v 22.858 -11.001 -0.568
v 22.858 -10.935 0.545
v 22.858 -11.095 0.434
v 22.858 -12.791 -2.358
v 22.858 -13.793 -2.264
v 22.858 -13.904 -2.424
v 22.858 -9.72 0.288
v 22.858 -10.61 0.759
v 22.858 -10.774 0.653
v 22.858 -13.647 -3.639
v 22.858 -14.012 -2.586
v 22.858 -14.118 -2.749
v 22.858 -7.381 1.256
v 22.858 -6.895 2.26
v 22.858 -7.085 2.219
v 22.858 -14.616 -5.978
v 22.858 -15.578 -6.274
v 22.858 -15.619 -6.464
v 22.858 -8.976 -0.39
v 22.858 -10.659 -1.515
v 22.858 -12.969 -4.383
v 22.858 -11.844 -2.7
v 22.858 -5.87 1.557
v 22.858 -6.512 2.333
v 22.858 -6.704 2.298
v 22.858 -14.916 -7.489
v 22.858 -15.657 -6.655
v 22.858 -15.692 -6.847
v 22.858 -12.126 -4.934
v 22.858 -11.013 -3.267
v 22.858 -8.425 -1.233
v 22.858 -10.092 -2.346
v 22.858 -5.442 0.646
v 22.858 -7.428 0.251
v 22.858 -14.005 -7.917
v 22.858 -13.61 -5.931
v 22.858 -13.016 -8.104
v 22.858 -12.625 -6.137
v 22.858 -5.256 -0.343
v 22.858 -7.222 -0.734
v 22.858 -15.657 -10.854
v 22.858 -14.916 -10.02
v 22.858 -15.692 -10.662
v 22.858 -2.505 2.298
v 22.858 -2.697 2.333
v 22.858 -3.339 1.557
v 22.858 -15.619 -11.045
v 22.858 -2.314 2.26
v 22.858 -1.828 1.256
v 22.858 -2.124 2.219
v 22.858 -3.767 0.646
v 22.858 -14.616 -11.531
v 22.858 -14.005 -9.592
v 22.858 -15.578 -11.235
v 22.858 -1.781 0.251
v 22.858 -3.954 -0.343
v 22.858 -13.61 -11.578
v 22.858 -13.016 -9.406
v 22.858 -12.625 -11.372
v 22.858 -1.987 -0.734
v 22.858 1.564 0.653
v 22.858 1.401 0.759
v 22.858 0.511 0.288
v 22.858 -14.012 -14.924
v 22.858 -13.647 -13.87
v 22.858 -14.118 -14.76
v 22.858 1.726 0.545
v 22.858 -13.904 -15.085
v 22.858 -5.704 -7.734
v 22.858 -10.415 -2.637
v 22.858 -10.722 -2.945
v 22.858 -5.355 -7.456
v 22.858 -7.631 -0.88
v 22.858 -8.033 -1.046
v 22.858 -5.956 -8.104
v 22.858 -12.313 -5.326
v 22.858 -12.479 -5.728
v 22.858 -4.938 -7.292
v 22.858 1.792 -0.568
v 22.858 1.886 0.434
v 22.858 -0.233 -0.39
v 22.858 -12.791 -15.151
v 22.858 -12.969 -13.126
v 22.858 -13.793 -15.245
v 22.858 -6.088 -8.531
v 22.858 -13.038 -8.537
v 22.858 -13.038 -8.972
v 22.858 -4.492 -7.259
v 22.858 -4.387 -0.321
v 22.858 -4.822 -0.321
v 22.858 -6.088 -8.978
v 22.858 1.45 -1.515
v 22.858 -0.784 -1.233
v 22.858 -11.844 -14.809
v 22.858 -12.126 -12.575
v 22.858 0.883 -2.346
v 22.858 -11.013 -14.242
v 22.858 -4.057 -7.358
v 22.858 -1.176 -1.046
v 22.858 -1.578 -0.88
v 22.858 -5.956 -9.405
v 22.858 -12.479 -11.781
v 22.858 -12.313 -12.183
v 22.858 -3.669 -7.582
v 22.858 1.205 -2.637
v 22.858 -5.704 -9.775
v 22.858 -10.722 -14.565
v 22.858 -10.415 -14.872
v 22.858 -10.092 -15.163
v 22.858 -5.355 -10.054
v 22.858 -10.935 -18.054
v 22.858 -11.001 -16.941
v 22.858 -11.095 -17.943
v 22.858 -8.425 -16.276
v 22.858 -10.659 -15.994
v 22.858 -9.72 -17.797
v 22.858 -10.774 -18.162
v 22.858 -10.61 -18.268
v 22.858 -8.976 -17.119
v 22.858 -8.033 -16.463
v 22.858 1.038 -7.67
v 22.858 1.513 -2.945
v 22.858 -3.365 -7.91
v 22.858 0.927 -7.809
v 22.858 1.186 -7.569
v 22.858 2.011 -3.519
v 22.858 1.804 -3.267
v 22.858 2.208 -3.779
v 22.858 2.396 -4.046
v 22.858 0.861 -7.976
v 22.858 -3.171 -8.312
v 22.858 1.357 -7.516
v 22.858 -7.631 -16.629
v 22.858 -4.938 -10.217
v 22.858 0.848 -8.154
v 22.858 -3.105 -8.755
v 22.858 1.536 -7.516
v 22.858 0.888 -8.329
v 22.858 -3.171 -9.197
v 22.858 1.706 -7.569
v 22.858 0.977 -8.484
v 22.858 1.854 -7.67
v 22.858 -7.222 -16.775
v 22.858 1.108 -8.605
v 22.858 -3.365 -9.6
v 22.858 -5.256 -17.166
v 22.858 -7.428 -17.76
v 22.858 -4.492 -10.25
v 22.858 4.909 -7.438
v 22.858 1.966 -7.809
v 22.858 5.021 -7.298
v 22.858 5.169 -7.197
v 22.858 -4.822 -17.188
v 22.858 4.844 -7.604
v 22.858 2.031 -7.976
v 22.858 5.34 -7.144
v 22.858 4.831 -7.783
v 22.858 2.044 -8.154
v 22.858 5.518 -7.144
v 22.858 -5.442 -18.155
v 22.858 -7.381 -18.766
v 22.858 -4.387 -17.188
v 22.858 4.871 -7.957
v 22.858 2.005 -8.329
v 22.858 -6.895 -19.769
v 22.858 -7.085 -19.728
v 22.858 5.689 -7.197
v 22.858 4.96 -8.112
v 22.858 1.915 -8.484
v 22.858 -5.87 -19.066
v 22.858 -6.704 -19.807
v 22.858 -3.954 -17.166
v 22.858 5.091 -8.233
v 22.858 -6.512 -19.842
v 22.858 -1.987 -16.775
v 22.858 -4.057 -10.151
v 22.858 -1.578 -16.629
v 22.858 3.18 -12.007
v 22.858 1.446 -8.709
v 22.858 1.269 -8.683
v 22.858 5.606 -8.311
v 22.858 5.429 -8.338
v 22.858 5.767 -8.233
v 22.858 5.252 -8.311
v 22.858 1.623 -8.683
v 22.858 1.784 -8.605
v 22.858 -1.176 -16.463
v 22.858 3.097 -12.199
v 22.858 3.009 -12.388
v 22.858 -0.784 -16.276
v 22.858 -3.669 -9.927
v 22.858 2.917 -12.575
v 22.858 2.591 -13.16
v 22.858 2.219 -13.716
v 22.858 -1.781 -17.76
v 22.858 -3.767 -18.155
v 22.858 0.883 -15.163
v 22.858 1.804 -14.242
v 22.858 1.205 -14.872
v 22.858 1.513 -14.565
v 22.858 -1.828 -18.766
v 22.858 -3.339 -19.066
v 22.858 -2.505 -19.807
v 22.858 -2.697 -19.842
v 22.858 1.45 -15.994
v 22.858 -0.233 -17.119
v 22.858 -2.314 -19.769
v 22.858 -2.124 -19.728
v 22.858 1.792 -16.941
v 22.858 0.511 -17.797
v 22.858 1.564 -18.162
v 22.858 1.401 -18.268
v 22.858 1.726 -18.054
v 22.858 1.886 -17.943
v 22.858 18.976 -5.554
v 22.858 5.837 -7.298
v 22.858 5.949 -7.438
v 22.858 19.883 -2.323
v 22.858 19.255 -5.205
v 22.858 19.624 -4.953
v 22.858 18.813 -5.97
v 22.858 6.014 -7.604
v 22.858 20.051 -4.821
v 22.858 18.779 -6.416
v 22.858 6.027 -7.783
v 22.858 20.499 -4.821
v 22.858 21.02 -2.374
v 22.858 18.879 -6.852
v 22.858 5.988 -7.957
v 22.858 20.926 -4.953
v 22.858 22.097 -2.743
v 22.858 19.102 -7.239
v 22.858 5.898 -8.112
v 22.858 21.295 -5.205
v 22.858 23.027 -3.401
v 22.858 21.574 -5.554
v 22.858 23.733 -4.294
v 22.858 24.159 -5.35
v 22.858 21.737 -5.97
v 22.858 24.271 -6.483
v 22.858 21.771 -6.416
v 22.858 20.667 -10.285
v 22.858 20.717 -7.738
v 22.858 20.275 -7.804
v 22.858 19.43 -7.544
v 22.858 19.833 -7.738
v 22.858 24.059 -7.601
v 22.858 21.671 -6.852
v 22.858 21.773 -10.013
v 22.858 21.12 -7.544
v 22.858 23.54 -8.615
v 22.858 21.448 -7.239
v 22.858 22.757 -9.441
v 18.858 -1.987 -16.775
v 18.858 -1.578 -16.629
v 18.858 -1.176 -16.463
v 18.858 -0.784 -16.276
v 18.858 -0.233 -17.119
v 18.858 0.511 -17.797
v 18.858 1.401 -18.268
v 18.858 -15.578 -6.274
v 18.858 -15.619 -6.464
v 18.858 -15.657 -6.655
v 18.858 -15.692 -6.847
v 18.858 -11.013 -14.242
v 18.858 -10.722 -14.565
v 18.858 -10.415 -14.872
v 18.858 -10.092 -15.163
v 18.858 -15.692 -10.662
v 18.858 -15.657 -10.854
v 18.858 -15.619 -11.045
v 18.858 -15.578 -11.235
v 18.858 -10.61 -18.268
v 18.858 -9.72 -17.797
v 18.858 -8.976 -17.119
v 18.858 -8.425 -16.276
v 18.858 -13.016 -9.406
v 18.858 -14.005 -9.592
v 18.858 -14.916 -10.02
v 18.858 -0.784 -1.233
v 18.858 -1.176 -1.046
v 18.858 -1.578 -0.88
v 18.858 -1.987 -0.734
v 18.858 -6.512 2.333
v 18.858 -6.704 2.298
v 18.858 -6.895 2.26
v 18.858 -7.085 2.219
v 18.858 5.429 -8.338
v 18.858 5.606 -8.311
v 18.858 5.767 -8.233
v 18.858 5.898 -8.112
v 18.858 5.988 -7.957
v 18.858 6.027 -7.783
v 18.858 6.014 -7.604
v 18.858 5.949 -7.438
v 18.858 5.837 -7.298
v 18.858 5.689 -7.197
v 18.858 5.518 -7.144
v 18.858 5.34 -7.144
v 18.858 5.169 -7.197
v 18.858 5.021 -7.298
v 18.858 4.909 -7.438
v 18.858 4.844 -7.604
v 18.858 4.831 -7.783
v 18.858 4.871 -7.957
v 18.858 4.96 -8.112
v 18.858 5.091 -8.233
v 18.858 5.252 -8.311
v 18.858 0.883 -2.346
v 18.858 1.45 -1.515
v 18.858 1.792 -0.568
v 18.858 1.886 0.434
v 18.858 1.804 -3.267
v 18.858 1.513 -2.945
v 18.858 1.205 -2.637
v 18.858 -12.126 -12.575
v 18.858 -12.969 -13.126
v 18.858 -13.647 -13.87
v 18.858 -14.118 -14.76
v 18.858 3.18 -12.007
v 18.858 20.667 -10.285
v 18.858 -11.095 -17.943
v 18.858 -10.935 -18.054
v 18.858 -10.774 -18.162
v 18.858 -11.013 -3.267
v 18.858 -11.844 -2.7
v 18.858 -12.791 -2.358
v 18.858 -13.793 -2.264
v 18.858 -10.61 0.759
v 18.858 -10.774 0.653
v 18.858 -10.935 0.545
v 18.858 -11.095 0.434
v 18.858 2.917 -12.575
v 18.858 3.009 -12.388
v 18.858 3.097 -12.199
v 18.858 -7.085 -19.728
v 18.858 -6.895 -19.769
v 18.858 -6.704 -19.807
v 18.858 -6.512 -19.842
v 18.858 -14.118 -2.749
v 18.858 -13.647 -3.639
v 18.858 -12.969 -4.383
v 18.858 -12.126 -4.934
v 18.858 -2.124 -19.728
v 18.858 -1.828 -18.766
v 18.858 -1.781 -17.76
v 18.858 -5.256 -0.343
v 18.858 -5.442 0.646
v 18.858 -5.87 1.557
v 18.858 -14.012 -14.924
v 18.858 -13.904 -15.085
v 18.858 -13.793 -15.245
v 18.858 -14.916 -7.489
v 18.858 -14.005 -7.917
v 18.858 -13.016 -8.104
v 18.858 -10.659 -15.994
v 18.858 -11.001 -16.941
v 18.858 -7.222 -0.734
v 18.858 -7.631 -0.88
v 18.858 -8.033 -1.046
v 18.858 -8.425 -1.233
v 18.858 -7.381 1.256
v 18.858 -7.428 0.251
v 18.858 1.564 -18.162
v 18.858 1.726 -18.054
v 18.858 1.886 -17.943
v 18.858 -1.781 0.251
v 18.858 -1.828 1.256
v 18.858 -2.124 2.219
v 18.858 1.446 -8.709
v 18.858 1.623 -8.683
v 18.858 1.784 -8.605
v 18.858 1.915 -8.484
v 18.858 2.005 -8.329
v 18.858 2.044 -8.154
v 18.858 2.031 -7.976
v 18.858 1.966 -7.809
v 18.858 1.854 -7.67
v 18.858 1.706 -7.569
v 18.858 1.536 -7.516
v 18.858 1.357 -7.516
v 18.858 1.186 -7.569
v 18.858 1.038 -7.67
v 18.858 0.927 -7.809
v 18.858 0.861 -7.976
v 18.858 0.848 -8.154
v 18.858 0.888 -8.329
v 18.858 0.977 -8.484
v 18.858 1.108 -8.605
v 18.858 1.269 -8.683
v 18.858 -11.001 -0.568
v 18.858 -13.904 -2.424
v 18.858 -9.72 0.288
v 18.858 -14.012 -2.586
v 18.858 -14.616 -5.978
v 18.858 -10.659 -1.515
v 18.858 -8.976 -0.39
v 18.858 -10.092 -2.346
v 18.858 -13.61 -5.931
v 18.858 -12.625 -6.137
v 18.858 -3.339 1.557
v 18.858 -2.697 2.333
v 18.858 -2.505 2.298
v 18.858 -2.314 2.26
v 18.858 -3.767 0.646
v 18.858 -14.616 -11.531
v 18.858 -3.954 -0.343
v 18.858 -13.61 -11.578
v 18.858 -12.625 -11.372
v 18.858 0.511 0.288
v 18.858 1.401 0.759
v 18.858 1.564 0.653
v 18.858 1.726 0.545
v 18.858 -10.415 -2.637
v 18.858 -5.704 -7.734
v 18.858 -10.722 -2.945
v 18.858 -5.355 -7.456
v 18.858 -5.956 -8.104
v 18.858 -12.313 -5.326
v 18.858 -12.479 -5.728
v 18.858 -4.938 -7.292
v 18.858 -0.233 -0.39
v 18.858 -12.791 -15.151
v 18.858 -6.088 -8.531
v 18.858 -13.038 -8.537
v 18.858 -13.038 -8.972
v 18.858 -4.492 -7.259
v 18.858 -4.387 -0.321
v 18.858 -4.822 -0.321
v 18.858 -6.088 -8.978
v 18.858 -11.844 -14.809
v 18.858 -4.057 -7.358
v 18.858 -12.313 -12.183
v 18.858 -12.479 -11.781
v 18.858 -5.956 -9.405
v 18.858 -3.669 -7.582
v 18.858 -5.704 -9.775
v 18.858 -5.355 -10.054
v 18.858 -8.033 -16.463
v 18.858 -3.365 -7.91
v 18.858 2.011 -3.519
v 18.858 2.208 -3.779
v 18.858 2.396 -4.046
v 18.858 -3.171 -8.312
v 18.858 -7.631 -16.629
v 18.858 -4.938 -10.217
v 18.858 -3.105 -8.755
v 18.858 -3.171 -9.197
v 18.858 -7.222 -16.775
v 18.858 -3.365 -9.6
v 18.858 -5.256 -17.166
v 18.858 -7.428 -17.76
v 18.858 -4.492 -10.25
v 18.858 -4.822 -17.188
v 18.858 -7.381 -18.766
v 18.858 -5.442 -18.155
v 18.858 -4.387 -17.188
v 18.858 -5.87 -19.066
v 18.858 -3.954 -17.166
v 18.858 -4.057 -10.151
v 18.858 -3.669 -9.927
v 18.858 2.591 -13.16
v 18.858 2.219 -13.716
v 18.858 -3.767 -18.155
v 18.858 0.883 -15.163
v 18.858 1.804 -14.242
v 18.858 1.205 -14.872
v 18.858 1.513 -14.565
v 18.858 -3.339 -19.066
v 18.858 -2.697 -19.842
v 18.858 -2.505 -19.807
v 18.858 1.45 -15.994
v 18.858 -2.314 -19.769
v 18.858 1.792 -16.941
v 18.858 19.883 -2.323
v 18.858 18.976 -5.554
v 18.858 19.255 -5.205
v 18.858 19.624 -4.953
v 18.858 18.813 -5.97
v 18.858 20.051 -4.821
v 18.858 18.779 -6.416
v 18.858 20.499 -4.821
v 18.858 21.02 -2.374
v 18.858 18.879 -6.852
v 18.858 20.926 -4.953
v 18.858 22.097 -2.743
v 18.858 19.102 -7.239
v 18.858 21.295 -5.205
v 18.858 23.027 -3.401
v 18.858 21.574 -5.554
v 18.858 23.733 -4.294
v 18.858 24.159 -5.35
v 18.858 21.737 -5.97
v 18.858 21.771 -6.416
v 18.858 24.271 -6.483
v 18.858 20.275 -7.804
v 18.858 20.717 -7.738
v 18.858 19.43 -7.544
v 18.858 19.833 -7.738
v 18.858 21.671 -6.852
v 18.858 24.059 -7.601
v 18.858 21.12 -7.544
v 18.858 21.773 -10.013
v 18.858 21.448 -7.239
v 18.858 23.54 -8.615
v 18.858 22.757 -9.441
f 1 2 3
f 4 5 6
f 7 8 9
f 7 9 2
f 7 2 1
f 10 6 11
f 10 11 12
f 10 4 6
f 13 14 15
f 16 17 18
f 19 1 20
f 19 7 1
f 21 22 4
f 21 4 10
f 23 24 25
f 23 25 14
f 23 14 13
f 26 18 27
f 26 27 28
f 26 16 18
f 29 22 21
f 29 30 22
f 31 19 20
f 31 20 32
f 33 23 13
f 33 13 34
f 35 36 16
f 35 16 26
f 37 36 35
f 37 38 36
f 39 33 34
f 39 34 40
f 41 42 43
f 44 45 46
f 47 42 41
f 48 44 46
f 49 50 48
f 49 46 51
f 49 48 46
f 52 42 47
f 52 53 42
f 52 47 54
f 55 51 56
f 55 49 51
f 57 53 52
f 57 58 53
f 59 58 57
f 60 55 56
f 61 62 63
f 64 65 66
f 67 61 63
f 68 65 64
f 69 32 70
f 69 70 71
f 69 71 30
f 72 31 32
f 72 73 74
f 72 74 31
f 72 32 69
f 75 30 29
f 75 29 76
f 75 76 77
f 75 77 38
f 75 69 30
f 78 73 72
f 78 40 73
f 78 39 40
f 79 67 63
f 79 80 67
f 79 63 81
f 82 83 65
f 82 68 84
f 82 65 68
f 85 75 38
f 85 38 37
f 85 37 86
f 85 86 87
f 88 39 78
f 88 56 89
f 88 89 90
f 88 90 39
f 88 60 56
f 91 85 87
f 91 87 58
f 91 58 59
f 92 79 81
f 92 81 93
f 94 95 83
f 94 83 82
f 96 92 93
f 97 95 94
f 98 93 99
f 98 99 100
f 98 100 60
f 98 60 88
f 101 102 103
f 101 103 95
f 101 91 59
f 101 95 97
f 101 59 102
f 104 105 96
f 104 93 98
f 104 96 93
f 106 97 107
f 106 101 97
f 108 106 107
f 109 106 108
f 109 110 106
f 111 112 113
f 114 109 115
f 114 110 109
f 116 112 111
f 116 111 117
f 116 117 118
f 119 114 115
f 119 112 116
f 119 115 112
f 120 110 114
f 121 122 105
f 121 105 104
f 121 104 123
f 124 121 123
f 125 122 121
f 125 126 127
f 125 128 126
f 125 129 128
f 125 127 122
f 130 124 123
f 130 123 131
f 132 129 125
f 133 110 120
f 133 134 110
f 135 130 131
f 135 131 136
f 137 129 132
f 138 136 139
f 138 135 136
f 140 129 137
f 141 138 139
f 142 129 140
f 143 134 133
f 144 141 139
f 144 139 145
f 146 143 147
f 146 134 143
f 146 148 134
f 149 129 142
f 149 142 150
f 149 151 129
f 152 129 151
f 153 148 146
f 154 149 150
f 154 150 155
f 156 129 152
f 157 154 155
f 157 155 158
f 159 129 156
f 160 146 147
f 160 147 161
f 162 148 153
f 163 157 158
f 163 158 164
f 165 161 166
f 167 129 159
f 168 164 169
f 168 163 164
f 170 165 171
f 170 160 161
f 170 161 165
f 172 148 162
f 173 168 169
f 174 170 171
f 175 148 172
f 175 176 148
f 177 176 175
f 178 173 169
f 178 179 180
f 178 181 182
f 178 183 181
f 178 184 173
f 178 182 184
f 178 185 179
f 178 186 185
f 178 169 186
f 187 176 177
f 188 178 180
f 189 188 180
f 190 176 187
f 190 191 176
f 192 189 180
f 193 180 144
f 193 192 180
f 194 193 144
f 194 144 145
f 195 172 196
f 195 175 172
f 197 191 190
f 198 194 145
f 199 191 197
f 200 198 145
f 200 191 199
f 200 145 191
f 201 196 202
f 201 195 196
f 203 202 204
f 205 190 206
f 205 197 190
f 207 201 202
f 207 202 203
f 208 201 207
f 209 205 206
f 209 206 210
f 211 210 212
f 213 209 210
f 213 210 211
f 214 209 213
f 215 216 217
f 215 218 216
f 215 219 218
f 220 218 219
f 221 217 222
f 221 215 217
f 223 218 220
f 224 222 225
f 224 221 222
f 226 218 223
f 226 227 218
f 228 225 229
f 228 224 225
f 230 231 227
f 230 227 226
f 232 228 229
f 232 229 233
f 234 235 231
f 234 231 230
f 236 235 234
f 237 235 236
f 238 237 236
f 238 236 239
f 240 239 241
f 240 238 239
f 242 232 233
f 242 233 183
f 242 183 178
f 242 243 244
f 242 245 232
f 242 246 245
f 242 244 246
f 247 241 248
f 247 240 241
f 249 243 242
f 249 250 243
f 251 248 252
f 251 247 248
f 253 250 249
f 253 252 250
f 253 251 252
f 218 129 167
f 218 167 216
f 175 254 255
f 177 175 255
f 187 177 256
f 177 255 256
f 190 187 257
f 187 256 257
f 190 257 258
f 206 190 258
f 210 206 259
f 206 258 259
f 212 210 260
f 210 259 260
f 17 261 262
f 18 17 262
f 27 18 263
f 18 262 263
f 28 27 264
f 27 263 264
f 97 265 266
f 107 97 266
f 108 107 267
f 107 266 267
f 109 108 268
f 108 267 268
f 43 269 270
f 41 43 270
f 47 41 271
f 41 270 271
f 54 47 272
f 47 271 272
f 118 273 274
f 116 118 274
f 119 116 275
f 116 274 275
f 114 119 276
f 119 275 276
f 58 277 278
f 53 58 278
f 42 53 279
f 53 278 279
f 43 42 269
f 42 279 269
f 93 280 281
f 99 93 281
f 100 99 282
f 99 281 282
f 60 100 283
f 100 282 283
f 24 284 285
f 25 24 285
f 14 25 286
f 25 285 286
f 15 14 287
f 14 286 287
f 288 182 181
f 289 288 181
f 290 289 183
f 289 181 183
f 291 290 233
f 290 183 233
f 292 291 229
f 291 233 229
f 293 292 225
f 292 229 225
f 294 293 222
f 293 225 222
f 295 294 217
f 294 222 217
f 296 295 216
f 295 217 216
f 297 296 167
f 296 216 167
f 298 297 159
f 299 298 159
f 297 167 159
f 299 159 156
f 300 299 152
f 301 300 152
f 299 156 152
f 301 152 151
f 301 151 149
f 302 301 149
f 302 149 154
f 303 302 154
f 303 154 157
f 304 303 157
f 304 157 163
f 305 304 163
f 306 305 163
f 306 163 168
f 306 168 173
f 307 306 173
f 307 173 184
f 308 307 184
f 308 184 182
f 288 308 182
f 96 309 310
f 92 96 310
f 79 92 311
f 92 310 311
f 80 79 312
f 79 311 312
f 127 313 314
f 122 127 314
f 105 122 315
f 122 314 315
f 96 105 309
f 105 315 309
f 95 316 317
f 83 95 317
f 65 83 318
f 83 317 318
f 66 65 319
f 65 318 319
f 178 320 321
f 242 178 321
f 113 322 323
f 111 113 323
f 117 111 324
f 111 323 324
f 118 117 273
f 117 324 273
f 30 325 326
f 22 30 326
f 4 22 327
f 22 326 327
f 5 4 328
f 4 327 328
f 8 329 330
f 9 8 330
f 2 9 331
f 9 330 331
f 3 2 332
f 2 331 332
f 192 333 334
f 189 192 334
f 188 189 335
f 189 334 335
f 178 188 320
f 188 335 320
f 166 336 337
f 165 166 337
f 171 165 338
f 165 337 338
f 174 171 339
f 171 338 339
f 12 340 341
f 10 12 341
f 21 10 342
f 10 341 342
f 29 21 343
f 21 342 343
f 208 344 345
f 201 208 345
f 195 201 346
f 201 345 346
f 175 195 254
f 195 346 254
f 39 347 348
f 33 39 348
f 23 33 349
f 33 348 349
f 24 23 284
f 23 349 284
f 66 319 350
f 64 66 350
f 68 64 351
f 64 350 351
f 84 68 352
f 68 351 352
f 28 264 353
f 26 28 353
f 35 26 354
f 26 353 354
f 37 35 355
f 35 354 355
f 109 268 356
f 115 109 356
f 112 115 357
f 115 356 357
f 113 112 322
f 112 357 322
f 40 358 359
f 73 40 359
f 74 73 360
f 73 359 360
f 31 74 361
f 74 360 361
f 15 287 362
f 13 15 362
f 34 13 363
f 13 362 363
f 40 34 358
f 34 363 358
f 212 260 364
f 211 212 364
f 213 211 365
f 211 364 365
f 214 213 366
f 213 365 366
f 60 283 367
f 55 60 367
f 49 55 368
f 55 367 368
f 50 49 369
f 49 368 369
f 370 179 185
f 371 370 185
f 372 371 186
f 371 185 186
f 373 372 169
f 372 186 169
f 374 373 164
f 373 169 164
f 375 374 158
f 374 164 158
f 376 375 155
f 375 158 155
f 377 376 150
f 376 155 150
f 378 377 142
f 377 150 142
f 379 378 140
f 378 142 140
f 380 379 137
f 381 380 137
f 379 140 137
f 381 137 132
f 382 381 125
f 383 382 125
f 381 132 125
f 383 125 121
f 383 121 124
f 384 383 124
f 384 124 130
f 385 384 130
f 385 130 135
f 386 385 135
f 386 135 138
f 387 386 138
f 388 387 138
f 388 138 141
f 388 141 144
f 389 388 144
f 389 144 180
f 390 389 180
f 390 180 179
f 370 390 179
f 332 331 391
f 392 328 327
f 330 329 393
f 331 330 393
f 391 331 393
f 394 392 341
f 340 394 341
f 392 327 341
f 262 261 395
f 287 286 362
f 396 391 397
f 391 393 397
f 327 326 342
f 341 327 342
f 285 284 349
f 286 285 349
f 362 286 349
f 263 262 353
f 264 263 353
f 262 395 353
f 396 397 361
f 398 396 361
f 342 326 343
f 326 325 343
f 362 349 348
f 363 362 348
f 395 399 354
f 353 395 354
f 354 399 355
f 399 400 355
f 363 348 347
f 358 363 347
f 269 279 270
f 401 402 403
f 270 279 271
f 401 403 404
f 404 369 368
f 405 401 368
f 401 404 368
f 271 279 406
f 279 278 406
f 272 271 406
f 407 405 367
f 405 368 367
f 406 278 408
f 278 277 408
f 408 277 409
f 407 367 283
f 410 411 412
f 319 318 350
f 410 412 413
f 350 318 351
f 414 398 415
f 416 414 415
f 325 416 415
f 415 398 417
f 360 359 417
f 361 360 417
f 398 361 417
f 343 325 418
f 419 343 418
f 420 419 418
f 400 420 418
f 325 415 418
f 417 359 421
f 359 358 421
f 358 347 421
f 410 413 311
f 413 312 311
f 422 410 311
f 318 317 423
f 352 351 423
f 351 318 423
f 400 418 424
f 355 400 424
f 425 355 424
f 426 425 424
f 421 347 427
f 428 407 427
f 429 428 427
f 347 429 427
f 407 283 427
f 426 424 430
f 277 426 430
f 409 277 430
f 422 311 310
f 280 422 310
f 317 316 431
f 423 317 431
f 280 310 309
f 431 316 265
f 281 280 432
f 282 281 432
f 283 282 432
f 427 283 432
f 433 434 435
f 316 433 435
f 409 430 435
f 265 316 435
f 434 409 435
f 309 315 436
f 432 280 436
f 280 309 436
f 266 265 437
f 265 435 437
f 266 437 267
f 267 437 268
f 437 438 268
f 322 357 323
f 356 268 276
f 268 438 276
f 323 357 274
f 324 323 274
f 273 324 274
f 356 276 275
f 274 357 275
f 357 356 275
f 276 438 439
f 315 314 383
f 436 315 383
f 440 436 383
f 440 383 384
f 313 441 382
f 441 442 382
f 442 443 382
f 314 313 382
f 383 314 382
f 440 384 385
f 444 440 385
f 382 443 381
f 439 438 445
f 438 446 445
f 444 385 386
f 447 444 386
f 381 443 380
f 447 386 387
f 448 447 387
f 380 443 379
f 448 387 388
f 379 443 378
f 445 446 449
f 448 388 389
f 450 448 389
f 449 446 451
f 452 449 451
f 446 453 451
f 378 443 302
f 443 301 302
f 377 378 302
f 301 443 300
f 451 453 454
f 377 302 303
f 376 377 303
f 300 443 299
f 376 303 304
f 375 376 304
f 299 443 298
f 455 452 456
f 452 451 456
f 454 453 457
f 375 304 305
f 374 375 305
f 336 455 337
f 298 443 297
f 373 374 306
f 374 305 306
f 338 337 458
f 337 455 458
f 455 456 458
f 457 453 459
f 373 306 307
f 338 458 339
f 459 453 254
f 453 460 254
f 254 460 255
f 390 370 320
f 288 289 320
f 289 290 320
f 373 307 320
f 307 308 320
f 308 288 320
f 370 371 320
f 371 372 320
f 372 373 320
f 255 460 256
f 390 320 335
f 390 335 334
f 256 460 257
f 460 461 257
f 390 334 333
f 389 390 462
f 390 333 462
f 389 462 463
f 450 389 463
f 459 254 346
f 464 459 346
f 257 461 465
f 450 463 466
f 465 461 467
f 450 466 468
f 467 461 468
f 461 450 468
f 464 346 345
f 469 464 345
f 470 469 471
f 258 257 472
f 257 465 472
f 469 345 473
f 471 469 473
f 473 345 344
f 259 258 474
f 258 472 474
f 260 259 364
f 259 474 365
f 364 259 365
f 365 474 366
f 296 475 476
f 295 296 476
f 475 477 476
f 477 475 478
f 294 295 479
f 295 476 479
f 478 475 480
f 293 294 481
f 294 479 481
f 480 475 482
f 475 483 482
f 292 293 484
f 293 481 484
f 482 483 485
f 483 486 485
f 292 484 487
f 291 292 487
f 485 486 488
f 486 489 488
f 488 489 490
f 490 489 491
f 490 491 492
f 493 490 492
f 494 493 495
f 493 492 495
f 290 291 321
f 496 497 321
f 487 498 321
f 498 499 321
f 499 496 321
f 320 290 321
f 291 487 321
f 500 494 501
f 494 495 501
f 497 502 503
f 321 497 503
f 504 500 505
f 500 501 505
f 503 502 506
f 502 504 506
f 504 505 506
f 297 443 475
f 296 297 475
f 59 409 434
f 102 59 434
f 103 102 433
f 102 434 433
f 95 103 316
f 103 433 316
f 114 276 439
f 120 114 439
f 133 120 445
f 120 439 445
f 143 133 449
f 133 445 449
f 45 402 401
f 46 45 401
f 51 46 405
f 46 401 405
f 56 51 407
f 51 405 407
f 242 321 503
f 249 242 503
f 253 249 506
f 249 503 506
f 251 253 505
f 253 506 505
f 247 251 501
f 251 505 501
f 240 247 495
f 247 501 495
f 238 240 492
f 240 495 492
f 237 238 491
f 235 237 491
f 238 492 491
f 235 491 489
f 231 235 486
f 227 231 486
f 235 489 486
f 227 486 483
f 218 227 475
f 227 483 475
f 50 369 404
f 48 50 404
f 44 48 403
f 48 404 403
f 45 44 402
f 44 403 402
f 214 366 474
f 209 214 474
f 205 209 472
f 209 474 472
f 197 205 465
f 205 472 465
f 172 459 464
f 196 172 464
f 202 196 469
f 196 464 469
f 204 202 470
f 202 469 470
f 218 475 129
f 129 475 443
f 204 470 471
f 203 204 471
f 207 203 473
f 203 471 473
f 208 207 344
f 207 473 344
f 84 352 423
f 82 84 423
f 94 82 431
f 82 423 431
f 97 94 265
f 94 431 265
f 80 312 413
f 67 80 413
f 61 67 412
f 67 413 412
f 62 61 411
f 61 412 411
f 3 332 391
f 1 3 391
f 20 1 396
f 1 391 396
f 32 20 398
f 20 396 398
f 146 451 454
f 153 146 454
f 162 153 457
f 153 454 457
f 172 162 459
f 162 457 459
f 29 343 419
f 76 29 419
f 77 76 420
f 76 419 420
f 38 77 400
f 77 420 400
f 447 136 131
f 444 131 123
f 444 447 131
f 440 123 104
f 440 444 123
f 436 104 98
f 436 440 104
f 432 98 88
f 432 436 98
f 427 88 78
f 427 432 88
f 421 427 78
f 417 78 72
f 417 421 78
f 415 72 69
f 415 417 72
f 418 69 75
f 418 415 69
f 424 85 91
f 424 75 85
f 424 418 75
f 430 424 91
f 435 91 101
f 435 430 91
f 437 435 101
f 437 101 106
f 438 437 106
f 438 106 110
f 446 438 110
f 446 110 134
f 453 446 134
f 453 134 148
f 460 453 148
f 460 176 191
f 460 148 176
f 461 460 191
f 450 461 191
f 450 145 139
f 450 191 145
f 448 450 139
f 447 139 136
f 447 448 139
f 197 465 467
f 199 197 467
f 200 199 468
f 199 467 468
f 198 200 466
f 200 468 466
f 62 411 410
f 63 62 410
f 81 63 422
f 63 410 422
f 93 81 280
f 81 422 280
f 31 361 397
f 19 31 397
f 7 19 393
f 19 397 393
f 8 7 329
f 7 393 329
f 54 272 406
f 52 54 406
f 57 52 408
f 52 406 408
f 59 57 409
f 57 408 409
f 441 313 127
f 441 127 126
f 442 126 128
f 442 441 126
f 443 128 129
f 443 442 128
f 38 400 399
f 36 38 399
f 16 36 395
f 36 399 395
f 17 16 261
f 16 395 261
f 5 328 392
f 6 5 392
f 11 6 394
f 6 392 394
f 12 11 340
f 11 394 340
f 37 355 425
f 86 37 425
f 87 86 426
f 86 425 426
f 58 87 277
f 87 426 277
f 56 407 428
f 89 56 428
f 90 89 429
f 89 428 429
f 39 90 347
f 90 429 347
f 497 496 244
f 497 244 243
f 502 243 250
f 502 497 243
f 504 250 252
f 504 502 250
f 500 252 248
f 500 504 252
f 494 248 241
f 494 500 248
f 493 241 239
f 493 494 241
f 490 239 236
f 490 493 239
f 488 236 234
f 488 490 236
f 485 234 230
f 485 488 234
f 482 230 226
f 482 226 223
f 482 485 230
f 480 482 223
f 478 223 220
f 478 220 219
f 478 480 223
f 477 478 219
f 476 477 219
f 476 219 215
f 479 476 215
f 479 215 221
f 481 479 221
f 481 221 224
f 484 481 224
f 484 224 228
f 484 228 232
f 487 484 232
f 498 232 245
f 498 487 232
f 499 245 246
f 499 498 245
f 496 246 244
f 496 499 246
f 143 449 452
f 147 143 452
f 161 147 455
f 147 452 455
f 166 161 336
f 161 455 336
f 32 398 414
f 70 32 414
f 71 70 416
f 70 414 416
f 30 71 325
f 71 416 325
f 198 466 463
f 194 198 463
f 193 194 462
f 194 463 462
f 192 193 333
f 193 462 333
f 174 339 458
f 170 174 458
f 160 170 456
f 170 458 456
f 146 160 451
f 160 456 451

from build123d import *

# Parameters (mm, degrees)
SPUR_START             = 18.857514679
SPUR_GEAR_GB_OUTLINE_R = 1.5
SPUR_GEAR_GB_DEPTH     = 4
CUT_EXTRUDE_START      = -10
CUT_EXTRUDE_1_DEPTH    = 10
EXTRUDE_START          = -4
SKETCH_3_R             = 1.5
EXTRUDE_1_DEPTH        = 4
SKETCH_5_R             = 0.6
CUT_EXTRUDE_2_DEPTH    = 10


# Read off the part's stored shape, not the designer's step: spur gear_gb
with BuildPart() as part:
    # spur gear_gb outline → spur gear_gb (new body)
    with BuildSketch(Plane.YZ.offset(SPUR_START)):
        with BuildLine():
            ThreePointArc((-2.124081285, 2.218549628), (-2.409806694, 2.279250398), (-2.69701173, 2.332512579))
            ThreePointArc((-2.69701173, 2.332512579), (-3.581509704, 1.114965359), (-3.953511283, -0.34324338))
            ThreePointArc((-3.953511283, -0.34324338), (-4.604572817, -0.318084007), (-5.25563435, -0.34324338))
            ThreePointArc((-5.25563435, -0.34324338), (-5.627635929, 1.114965359), (-6.512133903, 2.332512579))
            ThreePointArc((-6.512133903, 2.332512579), (-6.799338939, 2.279250398), (-7.085064348, 2.218549628))
            ThreePointArc((-7.085064348, 2.218549628), (-7.436298774, 0.75519995), (-7.221951093, -0.734368099))
            ThreePointArc((-7.221951093, -0.734368099), (-7.833081593, -0.960274331), (-8.424955943, -1.232669023))
            ThreePointArc((-8.424955943, -1.232669023), (-9.326672913, -0.027818656), (-10.609777638, 0.75856558))
            ThreePointArc((-10.609777638, 0.75856558), (-10.854737938, 0.599449132), (-11.095484616, 0.434026553))
            ThreePointArc((-11.095484616, 0.434026553), (-10.859983236, -1.052343859), (-10.091918787, -2.346497986))
            ThreePointArc((-10.091918787, -2.346497986), (-10.570079176, -2.789077647), (-11.012658837, -3.267238036))
            ThreePointArc((-11.012658837, -3.267238036), (-12.306812964, -2.499173587), (-13.793183376, -2.263672207))
            ThreePointArc((-13.793183376, -2.263672207), (-13.958605955, -2.504418885), (-14.117722403, -2.749379185))
            ThreePointArc((-14.117722403, -2.749379185), (-13.331338167, -4.03248391), (-12.1264878, -4.93420088))
            ThreePointArc((-12.1264878, -4.93420088), (-12.398882492, -5.52607523), (-12.624788724, -6.13720573))
            ThreePointArc((-12.624788724, -6.13720573), (-14.114356773, -5.922858049), (-15.577706451, -6.274092475))
            ThreePointArc((-15.577706451, -6.274092475), (-15.638407221, -6.559817884), (-15.691669402, -6.84702292))
            ThreePointArc((-15.691669402, -6.84702292), (-14.474122182, -7.731520894), (-13.015913443, -8.103522473))
            ThreePointArc((-13.015913443, -8.103522473), (-13.041072816, -8.754584007), (-13.015913443, -9.40564554))
            ThreePointArc((-13.015913443, -9.40564554), (-14.474122182, -9.777647119), (-15.691669402, -10.662145093))
            ThreePointArc((-15.691669402, -10.662145093), (-15.638407221, -10.949350129), (-15.577706451, -11.235075538))
            ThreePointArc((-15.577706451, -11.235075538), (-14.114356773, -11.586309964), (-12.624788724, -11.371962283))
            ThreePointArc((-12.624788724, -11.371962283), (-12.398882492, -11.983092783), (-12.1264878, -12.574967133))
            ThreePointArc((-12.1264878, -12.574967133), (-13.331338167, -13.476684103), (-14.117722403, -14.759788828))
            ThreePointArc((-14.117722403, -14.759788828), (-13.958605955, -15.004749128), (-13.793183376, -15.245495806))
            ThreePointArc((-13.793183376, -15.245495806), (-12.306812964, -15.009994426), (-11.012658837, -14.241929977))
            ThreePointArc((-11.012658837, -14.241929977), (-10.570079176, -14.720090366), (-10.091918787, -15.162670027))
            ThreePointArc((-10.091918787, -15.162670027), (-10.859983236, -16.456824154), (-11.095484616, -17.943194566))
            ThreePointArc((-11.095484616, -17.943194566), (-10.854737938, -18.108617145), (-10.609777638, -18.267733593))
            ThreePointArc((-10.609777638, -18.267733593), (-9.326672913, -17.481349357), (-8.424955943, -16.27649899))
            ThreePointArc((-8.424955943, -16.27649899), (-7.833081594, -16.548893683), (-7.221951093, -16.774799914))
            ThreePointArc((-7.221951093, -16.774799914), (-7.436298774, -18.264367963), (-7.085064348, -19.727717641))
            ThreePointArc((-7.085064348, -19.727717641), (-6.799338939, -19.788418411), (-6.512133903, -19.841680592))
            ThreePointArc((-6.512133903, -19.841680592), (-5.627635929, -18.624133372), (-5.25563435, -17.165924633))
            ThreePointArc((-5.25563435, -17.165924633), (-4.604572817, -17.191084007), (-3.953511283, -17.165924633))
            ThreePointArc((-3.953511283, -17.165924633), (-3.581509704, -18.624133372), (-2.69701173, -19.841680592))
            ThreePointArc((-2.69701173, -19.841680592), (-2.409806694, -19.788418411), (-2.124081285, -19.727717641))
            ThreePointArc((-2.124081285, -19.727717641), (-1.772846859, -18.264367963), (-1.98719454, -16.774799914))
            ThreePointArc((-1.98719454, -16.774799914), (-1.376064039, -16.548893683), (-0.78418969, -16.27649899))
            ThreePointArc((-0.78418969, -16.27649899), (0.11752728, -17.481349357), (1.400632005, -18.267733593))
            ThreePointArc((1.400632005, -18.267733593), (1.645592305, -18.108617145), (1.886338983, -17.943194566))
            ThreePointArc((1.886338983, -17.943194566), (1.650837603, -16.456824154), (0.882773154, -15.162670027))
            ThreePointArc((0.882773154, -15.162670027), (1.360933543, -14.720090366), (1.803513204, -14.241929977))
            ThreePointArc((1.803513204, -14.241929977), (3.097667331, -15.009994426), (4.584037743, -15.245495806))
            ThreePointArc((4.584037743, -15.245495806), (4.749460322, -15.004749128), (4.90857677, -14.759788828))
            ThreePointArc((4.90857677, -14.759788828), (4.122192534, -13.476684103), (2.917342167, -12.574967133))
            ThreePointArc((2.917342167, -12.574967133), (3.18973686, -11.983092784), (3.415643091, -11.371962283))
            ThreePointArc((3.415643091, -11.371962283), (4.90521114, -11.586309964), (6.368560818, -11.235075538))
            ThreePointArc((6.368560818, -11.235075538), (6.429261588, -10.949350129), (6.482523769, -10.662145093))
            ThreePointArc((6.482523769, -10.662145093), (5.264976549, -9.777647119), (3.80676781, -9.40564554))
            ThreePointArc((3.80676781, -9.40564554), (3.831927184, -8.754584007), (3.80676781, -8.103522473))
            ThreePointArc((3.80676781, -8.103522473), (5.264976549, -7.731520894), (6.482523769, -6.84702292))
            ThreePointArc((6.482523769, -6.84702292), (6.429261588, -6.559817884), (6.368560818, -6.274092475))
            ThreePointArc((6.368560818, -6.274092475), (4.90521114, -5.922858049), (3.415643091, -6.13720573))
            ThreePointArc((3.415643091, -6.13720573), (3.18973686, -5.526075229), (2.917342167, -4.93420088))
            ThreePointArc((2.917342167, -4.93420088), (4.122192534, -4.03248391), (4.90857677, -2.749379185))
            ThreePointArc((4.90857677, -2.749379185), (4.749460322, -2.504418885), (4.584037743, -2.263672207))
            ThreePointArc((4.584037743, -2.263672207), (3.097667331, -2.499173587), (1.803513204, -3.267238036))
            ThreePointArc((1.803513204, -3.267238036), (1.360933543, -2.789077647), (0.882773154, -2.346497986))
            ThreePointArc((0.882773154, -2.346497986), (1.650837603, -1.052343859), (1.886338983, 0.434026553))
            ThreePointArc((1.886338983, 0.434026553), (1.645592305, 0.599449132), (1.400632005, 0.75856558))
            ThreePointArc((1.400632005, 0.75856558), (0.11752728, -0.027818656), (-0.78418969, -1.232669023))
            ThreePointArc((-0.78418969, -1.232669023), (-1.37606404, -0.960274331), (-1.98719454, -0.734368099))
            ThreePointArc((-1.98719454, -0.734368099), (-1.772846859, 0.75519995), (-2.124081285, 2.218549628))
        make_face()
        with Locations((-4.604572816, -8.754584007)):
            Circle(SPUR_GEAR_GB_OUTLINE_R, mode=Mode.SUBTRACT)
    extrude(amount=SPUR_GEAR_GB_DEPTH)

    # 草图2 → 切除-拉伸1 (cut)
    with BuildSketch(Plane(origin=(22.857514679, 0, 0), x_dir=(0, 0, -1), z_dir=(1, 0, 0)).offset(CUT_EXTRUDE_START)):
        with BuildLine():
            ThreePointArc((14.241929977, 1.803513204), (13.441652277, 2.410120568), (12.574967133, 2.917342167))
            ThreePointArc((12.574967133, 2.917342167), (13.476684103, 4.122192534), (14.759788828, 4.90857677))
            ThreePointArc((14.759788828, 4.90857677), (15.004749128, 4.749460322), (15.245495806, 4.584037743))
            ThreePointArc((15.245495806, 4.584037743), (15.009994426, 3.097667331), (14.241929977, 1.803513204))
        make_face()
        with BuildLine():
            ThreePointArc((11.371962283, 3.415643091), (11.586309964, 4.905211141), (11.235075538, 6.368560818))
            ThreePointArc((11.235075538, 6.368560818), (10.949350129, 6.429261588), (10.662145093, 6.482523769))
            ThreePointArc((10.662145093, 6.482523769), (9.777647119, 5.264976549), (9.40564554, 3.80676781))
            ThreePointArc((9.40564554, 3.80676781), (10.400463508, 3.669822202), (11.371962283, 3.415643091))
        make_face()
        with BuildLine():
            ThreePointArc((8.103522473, 3.80676781), (7.731520894, 5.264976549), (6.84702292, 6.482523769))
            ThreePointArc((6.84702292, 6.482523769), (6.559817884, 6.429261588), (6.274092475, 6.368560818))
            ThreePointArc((6.274092475, 6.368560818), (5.922858049, 4.905211141), (6.13720573, 3.415643091))
            ThreePointArc((6.13720573, 3.415643091), (7.108704505, 3.669822202), (8.103522473, 3.80676781))
        make_face()
        with BuildLine():
            ThreePointArc((4.93420088, 2.917342167), (4.03248391, 4.122192534), (2.749379185, 4.90857677))
            ThreePointArc((2.749379185, 4.90857677), (2.504418885, 4.749460322), (2.263672207, 4.584037743))
            ThreePointArc((2.263672207, 4.584037743), (2.499173587, 3.097667331), (3.267238036, 1.803513204))
            ThreePointArc((3.267238036, 1.803513204), (4.067515736, 2.410120568), (4.93420088, 2.917342167))
        make_face()
    extrude(amount=CUT_EXTRUDE_1_DEPTH, mode=Mode.SUBTRACT)

    # 草图3 → 凸台-拉伸1 (add)
    with BuildSketch(Plane(origin=(22.857514679, 0, 0), x_dir=(0, 0, -1), z_dir=(1, 0, 0)).offset(EXTRUDE_START)):
        with BuildLine():
            Line((2.323416592, 19.882976789), (4.7738451, -4.996641378))
            ThreePointArc((4.7738451, -4.996641378), (9.146652568, -8.585311723), (12.735322913, -4.212504255))
            Line((12.735322913, -4.212504255), (10.284894405, 20.667113912))
            ThreePointArc((10.284894405, 20.667113912), (5.912086937, 24.255784257), (2.323416592, 19.882976789))
        make_face()
        with Locations((6.304155498, 20.27504535)):
            Circle(SKETCH_3_R, mode=Mode.SUBTRACT)
        with Locations(Location((8.754584007, -4.604572816, 0), (0, 0, 180))):
            Circle(SKETCH_3_R, mode=Mode.SUBTRACT)
    extrude(amount=EXTRUDE_1_DEPTH)

    # 草图5 → 切除-拉伸2 (cut)
    with BuildSketch(Plane(origin=(22.857514679, 0, 0), x_dir=(0, 0, -1), z_dir=(1, 0, 0))):
        with Locations((8.109420565, 1.446128724)):
            Circle(SKETCH_5_R)
        with Locations((7.737682597, 5.429027561)):
            Circle(SKETCH_5_R)
    extrude(amount=-CUT_EXTRUDE_2_DEPTH, mode=Mode.SUBTRACT)


solid = part.part
